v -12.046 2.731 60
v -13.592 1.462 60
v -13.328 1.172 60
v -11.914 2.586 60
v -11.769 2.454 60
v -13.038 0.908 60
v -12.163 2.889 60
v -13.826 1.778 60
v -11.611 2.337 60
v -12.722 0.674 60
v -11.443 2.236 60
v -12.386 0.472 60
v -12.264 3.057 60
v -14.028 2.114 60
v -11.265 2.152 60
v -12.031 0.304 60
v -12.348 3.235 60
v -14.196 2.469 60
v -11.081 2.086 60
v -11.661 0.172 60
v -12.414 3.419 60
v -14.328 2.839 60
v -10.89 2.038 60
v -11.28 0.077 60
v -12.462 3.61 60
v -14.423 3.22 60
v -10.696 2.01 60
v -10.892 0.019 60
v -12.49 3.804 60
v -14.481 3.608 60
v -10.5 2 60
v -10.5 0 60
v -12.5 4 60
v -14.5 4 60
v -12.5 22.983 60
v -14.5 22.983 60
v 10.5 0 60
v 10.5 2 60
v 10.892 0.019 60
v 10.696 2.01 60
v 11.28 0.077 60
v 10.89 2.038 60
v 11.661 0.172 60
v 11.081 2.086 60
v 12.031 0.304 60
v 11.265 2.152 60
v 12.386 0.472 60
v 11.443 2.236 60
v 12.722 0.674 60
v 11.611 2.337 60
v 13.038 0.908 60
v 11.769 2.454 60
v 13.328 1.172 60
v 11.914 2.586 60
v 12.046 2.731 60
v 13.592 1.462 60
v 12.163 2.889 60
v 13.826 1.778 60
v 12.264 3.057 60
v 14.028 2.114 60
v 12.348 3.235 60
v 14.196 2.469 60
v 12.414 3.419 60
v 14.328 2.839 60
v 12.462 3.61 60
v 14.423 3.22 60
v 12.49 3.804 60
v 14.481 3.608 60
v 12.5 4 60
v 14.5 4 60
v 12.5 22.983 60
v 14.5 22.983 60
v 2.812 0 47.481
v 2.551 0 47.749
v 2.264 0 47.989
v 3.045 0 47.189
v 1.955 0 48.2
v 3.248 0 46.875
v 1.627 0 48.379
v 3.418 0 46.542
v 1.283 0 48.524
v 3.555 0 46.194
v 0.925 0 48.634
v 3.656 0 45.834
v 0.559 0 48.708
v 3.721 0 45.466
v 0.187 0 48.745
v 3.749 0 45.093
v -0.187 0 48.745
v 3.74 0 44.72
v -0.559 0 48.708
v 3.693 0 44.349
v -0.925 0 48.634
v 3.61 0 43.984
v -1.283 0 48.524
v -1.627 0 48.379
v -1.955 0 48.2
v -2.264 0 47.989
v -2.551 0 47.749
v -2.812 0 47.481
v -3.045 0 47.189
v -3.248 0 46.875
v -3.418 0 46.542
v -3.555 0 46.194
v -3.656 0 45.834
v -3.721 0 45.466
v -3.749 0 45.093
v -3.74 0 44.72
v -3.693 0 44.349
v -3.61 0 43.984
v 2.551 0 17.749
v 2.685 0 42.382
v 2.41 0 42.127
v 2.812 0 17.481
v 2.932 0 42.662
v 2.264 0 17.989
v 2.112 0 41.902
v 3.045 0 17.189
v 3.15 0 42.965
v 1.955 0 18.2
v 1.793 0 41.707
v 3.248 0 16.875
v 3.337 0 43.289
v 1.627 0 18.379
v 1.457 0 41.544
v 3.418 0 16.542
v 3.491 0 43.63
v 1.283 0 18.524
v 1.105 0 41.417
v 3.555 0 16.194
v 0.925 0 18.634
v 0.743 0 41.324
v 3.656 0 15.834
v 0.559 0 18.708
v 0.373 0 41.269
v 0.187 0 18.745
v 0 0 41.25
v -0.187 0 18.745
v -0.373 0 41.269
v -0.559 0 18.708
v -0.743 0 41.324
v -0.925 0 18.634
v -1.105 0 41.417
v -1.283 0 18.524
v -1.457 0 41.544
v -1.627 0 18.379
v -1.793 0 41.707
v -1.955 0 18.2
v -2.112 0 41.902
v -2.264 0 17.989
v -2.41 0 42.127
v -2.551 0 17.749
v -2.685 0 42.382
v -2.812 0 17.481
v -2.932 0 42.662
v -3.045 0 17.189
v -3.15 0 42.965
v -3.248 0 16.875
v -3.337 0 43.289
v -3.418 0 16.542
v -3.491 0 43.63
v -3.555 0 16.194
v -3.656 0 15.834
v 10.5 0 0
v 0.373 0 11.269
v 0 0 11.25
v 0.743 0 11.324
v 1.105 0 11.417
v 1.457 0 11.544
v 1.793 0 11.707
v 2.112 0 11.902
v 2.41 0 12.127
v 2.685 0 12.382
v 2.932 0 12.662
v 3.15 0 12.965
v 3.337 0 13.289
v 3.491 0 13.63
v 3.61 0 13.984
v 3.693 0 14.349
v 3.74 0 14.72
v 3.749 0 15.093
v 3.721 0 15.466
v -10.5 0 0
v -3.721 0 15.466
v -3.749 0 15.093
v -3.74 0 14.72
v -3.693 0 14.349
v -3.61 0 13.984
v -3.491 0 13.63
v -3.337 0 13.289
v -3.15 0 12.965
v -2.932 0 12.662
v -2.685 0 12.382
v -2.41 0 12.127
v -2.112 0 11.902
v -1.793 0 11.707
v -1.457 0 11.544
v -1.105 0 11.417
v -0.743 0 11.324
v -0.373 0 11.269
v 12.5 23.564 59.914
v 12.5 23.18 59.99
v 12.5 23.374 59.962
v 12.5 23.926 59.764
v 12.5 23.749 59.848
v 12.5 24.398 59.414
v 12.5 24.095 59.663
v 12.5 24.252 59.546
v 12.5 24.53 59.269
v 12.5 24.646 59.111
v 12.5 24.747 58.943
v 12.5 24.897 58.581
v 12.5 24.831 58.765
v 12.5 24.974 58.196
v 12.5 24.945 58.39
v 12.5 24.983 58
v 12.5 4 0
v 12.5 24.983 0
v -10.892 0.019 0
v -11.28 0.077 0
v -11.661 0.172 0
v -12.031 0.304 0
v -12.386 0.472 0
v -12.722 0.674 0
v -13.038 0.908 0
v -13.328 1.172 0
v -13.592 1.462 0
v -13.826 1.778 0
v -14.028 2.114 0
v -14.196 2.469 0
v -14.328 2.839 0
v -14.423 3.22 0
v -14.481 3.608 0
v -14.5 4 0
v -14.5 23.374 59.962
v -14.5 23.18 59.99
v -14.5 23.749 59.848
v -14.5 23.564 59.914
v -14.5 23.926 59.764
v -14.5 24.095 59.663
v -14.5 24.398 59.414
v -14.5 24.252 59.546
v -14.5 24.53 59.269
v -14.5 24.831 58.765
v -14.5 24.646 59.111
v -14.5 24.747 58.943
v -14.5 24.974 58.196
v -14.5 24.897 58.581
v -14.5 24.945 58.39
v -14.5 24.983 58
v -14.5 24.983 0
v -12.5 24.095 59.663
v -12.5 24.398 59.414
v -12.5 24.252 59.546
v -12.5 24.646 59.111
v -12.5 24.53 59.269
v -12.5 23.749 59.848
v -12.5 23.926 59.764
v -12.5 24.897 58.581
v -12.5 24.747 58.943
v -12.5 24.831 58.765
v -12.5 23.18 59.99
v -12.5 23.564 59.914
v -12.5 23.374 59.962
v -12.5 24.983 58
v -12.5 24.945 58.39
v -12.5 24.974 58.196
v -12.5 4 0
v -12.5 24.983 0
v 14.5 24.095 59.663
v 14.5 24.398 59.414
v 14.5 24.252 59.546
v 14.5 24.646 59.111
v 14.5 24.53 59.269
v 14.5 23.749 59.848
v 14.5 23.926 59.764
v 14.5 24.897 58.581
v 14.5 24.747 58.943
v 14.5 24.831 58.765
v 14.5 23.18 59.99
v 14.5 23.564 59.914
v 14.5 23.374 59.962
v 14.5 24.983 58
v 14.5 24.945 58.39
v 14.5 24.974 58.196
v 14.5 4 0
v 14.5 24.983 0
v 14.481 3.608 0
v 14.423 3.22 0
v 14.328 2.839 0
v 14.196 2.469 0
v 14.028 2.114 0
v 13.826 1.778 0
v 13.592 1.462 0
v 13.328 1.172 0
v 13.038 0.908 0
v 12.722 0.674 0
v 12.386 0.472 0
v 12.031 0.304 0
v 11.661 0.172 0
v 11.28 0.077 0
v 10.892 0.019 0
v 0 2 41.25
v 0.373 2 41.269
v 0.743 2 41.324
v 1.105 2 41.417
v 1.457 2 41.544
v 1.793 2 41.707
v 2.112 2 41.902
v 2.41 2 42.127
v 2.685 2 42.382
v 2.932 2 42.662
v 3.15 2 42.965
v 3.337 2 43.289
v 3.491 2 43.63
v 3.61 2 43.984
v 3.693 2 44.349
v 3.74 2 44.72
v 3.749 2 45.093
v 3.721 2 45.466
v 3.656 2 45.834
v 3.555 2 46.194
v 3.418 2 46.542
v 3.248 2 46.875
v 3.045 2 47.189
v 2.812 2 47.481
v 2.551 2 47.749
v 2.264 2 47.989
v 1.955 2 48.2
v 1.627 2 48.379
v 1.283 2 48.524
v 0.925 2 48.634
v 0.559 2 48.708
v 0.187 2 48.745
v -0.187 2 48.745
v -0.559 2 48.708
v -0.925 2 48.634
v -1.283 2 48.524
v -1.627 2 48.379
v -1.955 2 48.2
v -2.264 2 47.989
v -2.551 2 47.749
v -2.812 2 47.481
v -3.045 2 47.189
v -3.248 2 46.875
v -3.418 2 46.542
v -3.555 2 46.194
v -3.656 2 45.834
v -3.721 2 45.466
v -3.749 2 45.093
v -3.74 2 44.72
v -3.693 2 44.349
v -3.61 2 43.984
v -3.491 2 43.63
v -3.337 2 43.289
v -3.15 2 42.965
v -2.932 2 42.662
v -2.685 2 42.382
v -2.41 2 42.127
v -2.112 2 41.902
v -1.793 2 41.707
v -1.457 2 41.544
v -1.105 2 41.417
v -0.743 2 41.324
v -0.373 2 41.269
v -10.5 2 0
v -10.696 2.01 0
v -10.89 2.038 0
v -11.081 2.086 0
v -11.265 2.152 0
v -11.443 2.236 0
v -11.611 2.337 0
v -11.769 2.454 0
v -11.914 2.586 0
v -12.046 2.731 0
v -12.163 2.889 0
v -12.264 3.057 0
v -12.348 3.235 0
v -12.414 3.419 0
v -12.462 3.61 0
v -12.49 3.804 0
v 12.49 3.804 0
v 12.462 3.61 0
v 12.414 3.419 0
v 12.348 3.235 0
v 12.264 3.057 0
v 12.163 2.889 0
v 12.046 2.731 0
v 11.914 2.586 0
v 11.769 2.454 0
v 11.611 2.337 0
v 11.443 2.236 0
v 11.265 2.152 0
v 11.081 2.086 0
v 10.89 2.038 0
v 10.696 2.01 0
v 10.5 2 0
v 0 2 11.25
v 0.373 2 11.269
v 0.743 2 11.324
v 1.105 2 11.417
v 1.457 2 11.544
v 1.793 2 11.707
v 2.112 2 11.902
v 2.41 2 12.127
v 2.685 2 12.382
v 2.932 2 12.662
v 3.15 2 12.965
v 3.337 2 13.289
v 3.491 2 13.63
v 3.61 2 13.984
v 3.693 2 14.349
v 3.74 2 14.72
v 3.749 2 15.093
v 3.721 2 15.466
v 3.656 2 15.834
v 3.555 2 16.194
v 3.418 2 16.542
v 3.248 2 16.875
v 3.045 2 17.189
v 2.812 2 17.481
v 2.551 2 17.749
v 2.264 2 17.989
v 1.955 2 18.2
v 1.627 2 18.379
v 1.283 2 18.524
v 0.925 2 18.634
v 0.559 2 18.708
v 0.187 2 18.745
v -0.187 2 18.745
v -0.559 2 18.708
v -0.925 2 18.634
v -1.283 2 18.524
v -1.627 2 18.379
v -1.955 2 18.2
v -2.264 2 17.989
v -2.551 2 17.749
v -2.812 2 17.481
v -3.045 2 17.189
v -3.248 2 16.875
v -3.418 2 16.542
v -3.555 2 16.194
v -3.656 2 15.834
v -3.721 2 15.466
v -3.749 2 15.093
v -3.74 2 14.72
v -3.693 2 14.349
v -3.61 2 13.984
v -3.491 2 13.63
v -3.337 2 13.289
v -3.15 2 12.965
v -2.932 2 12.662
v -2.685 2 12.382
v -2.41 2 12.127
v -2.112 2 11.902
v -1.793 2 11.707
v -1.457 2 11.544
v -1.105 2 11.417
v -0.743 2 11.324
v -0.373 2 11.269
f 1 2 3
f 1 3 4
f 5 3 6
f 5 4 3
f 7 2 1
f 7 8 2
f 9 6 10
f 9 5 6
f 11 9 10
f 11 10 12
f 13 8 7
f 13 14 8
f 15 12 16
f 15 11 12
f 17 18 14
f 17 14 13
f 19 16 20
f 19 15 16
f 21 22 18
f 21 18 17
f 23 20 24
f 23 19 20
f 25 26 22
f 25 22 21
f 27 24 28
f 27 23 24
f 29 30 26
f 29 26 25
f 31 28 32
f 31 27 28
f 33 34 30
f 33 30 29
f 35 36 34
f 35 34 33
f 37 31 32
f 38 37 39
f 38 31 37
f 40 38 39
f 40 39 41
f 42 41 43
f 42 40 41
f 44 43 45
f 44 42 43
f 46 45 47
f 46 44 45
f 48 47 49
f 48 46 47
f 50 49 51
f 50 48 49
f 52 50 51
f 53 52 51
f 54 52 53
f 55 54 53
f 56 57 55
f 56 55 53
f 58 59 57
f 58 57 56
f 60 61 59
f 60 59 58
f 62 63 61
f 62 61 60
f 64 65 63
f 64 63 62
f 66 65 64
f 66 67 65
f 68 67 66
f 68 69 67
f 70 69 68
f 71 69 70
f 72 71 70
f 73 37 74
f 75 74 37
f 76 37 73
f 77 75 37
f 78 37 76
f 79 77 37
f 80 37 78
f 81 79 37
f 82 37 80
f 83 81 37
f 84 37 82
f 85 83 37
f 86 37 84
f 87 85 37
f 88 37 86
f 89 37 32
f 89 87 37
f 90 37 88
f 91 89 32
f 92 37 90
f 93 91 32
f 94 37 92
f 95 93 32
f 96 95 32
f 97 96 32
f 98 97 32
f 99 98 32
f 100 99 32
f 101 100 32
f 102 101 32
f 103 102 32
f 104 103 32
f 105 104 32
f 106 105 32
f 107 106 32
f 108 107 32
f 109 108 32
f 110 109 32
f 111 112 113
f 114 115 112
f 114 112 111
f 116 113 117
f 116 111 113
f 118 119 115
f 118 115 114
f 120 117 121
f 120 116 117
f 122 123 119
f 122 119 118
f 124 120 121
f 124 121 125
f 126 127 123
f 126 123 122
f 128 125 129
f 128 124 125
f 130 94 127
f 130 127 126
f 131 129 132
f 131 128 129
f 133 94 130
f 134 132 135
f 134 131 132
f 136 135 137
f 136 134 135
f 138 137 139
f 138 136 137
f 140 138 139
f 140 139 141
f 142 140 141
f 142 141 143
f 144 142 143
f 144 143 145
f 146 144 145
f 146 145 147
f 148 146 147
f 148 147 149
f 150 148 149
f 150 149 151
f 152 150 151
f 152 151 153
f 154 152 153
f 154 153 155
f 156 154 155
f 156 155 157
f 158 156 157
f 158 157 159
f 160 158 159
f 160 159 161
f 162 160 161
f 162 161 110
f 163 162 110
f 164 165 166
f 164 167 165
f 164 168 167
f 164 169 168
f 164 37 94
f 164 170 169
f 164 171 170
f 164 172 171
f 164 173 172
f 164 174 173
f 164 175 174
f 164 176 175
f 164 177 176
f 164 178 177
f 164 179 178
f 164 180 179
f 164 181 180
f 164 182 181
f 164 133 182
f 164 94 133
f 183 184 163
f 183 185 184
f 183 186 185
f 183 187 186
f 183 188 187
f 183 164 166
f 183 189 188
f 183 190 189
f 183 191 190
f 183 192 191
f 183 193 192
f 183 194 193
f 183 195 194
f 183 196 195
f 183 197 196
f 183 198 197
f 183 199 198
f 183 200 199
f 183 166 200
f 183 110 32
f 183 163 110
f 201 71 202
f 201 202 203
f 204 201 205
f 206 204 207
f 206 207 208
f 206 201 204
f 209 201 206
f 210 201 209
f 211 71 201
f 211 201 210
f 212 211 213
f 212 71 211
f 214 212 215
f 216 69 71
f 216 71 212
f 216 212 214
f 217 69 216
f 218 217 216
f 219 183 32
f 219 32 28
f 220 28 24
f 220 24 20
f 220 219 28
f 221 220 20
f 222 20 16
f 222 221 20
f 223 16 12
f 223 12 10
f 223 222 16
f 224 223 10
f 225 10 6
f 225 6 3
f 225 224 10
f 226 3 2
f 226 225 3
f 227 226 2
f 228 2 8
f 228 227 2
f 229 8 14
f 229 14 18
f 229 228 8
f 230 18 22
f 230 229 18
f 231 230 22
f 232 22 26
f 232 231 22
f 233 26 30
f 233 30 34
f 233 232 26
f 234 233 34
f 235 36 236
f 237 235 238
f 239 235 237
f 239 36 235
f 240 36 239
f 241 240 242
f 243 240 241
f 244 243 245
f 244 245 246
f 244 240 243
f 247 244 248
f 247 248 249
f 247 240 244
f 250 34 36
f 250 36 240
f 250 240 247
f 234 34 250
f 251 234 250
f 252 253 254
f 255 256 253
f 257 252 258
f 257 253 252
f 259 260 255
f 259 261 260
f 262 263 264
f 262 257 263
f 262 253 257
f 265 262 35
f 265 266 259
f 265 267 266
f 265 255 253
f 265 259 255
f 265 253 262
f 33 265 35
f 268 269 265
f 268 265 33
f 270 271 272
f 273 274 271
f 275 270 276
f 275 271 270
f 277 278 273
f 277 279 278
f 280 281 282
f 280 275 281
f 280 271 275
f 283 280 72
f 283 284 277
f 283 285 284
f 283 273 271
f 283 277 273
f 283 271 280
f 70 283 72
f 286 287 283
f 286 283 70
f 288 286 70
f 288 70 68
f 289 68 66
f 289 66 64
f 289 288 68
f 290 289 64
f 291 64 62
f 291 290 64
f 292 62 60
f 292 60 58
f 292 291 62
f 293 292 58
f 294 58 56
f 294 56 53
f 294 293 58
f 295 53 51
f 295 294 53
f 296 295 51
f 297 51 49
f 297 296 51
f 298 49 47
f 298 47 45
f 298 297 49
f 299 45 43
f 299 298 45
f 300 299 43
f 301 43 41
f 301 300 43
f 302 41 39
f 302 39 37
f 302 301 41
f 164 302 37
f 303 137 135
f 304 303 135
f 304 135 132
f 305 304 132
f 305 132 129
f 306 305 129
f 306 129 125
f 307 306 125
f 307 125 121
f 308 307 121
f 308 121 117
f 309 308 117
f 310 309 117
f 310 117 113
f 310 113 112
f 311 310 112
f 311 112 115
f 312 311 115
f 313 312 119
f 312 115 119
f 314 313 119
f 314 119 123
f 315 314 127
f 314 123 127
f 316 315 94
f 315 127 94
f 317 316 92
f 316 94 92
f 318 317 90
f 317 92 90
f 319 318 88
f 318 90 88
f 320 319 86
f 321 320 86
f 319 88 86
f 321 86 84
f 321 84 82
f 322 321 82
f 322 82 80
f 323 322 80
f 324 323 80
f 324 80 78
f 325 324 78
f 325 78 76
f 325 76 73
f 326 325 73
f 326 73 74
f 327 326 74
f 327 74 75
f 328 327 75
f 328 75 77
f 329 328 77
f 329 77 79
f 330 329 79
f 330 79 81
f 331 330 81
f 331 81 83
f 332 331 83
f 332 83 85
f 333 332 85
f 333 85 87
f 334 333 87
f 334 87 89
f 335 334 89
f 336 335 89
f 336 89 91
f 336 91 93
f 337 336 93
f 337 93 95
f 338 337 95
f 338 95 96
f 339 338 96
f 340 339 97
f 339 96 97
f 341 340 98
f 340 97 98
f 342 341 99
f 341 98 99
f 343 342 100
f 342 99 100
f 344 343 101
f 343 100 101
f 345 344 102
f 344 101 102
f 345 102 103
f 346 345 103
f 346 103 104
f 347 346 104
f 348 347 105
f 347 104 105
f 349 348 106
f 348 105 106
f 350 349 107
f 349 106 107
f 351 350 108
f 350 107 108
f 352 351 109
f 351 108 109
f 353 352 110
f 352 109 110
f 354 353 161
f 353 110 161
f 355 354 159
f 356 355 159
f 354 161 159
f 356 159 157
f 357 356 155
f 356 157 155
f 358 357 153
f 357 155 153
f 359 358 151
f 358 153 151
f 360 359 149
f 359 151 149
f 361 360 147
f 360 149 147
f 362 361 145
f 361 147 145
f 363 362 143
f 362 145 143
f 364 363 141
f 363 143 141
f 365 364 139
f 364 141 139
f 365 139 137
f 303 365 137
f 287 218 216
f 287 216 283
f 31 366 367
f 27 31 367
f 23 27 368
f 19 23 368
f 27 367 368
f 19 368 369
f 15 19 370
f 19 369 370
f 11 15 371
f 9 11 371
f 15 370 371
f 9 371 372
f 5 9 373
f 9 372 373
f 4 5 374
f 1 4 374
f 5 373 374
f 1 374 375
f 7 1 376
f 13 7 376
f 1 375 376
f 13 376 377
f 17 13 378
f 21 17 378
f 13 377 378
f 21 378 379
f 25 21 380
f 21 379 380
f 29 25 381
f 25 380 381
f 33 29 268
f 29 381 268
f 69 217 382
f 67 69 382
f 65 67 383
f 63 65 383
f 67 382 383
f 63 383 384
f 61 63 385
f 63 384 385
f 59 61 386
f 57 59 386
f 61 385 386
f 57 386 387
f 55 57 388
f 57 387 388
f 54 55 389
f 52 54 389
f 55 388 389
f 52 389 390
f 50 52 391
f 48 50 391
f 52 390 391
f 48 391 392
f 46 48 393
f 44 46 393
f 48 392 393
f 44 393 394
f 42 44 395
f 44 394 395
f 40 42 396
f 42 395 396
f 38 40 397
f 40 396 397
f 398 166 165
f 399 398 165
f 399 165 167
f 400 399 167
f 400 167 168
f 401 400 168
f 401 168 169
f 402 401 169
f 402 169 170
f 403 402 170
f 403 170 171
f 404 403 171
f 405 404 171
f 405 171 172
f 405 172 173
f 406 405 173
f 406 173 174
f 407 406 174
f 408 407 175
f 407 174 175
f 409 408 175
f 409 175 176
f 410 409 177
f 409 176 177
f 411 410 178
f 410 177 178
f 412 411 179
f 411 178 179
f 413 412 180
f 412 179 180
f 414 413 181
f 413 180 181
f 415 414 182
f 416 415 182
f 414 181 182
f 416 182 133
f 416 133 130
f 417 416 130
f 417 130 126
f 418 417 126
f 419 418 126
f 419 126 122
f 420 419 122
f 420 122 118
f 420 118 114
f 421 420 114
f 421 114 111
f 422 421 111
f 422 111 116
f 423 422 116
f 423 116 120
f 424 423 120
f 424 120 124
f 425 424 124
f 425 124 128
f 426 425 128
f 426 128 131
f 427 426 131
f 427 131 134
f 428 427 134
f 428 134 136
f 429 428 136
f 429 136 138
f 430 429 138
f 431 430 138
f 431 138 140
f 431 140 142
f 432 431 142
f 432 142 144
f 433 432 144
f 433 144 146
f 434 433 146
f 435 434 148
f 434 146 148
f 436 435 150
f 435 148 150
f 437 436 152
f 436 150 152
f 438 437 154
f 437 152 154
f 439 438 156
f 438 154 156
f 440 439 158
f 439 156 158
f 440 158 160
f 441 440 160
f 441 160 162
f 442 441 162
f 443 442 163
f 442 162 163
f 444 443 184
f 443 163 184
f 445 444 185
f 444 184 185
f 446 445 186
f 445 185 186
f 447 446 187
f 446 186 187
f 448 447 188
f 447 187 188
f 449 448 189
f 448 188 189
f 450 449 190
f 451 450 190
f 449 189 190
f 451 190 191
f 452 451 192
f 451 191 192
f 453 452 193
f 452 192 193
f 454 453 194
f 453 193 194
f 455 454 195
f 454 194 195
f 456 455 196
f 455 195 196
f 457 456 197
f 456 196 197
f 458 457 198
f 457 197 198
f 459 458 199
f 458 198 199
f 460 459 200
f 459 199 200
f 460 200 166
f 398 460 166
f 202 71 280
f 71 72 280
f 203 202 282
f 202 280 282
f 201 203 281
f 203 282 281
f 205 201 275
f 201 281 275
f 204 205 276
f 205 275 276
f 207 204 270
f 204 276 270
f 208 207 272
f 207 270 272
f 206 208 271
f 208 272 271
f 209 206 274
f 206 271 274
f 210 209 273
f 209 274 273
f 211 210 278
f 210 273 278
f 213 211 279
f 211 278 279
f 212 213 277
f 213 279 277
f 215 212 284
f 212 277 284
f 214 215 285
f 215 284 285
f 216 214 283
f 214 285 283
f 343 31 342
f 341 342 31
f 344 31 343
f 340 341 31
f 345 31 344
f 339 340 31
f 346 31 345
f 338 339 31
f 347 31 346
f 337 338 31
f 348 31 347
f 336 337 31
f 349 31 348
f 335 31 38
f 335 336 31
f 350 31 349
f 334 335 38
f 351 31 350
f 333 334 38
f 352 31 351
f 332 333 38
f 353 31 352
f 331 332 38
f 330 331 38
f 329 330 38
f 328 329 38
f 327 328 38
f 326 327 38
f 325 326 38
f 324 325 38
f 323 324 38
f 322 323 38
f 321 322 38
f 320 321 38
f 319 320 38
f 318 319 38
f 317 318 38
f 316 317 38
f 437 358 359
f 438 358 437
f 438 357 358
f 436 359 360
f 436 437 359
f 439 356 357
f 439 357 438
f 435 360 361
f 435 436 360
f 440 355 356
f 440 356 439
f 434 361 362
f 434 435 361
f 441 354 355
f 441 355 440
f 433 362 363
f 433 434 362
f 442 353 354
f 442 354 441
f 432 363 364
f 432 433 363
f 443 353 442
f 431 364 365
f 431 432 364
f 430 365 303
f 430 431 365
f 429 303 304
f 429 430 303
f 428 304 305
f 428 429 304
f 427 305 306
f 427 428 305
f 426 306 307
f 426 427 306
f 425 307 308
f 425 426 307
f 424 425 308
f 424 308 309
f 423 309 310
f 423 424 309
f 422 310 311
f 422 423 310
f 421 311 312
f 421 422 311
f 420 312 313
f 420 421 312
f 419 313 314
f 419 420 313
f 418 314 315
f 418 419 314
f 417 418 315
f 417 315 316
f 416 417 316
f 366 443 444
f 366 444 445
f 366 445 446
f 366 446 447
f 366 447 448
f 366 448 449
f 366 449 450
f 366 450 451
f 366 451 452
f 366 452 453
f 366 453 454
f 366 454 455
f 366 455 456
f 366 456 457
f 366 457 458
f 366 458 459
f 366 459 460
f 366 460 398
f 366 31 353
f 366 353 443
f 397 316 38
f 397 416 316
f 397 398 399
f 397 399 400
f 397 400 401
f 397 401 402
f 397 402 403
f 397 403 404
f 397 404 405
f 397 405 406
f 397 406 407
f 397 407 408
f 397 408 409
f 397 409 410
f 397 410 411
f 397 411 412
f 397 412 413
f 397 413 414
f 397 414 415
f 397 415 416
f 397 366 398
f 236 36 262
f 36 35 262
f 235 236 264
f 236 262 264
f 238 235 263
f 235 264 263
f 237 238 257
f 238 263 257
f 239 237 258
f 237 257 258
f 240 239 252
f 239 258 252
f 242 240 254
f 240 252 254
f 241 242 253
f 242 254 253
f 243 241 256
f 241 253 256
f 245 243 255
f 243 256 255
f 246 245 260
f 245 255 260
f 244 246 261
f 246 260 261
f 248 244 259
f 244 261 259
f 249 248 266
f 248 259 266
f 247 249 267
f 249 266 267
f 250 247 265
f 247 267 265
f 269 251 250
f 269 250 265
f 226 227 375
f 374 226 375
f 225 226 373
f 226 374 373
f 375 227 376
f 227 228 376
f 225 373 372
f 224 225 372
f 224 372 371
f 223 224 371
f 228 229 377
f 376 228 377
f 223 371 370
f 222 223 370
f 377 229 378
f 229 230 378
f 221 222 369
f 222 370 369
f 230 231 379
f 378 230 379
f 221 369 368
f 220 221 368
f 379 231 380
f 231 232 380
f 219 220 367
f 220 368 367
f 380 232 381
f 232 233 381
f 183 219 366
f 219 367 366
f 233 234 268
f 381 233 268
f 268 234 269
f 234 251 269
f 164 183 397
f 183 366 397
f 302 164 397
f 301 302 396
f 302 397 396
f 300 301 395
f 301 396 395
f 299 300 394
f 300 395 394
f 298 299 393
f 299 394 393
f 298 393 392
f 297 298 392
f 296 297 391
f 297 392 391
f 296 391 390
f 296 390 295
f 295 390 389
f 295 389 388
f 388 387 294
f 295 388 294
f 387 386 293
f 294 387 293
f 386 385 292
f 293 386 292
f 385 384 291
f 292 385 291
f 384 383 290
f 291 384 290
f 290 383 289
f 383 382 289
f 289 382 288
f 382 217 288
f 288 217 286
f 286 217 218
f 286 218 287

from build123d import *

# Parameters (mm, degrees)
EXTRUDE_1_DEPTH       = 60
SHEET_METAL_1_DEPTH   = 60
SHEET_METAL_1_2_DEPTH = 60
CUT_EXTRUDE_1_REACH   = 68.591
SKETCH_2_R            = 3.75
FILLET_1_R            = 2


# Read off the part's stored shape, not the designer's step: Преобразовать-Твердое тело1
with BuildPart() as part:
    # Sketch 1 → Бобышка-Вытянуть1 (new body)
    with BuildSketch(Plane.XY):
        Polygon((-12.5, 2), (12.5, 2), (12.5, 24.983479724), (14.5, 24.983479724), (14.5, 0), (-14.5, 0), (-14.5, 24.983479724), (-12.5, 24.983479724), align=None)
    extrude(amount=EXTRUDE_1_DEPTH)

    # Sheet Metal 1 outline → Sheet Metal 1 (cut)
    with BuildSketch(Plane.XY):
        with BuildLine():
            Line((-14.5, 0), (-10.5, 0))
            ThreePointArc((-10.5, 0), (-13.328427125, 1.171572875), (-14.5, 4))
            Line((-14.5, 4), (-14.5, 0))
        make_face()
        with BuildLine():
            ThreePointArc((14.5, 4), (13.328427125, 1.171572875), (10.5, 0))
            Line((10.5, 0), (14.5, 0))
            Line((14.5, 0), (14.5, 4))
        make_face()
    extrude(amount=SHEET_METAL_1_DEPTH, mode=Mode.SUBTRACT)

    # Sheet Metal 1 2 outline → Sheet Metal 1 2 (add)
    with BuildSketch(Plane.XY):
        with BuildLine():
            Line((-12.5, 2), (-10.5, 2))
            ThreePointArc((-10.5, 2), (-11.914213562, 2.585786438), (-12.5, 4))
            Line((-12.5, 4), (-12.5, 2))
        make_face()
        with BuildLine():
            ThreePointArc((12.5, 4), (11.914213562, 2.585786438), (10.5, 2))
            Line((10.5, 2), (12.5, 2))
            Line((12.5, 2), (12.5, 4))
        make_face()
    extrude(amount=SHEET_METAL_1_2_DEPTH)

    # Sketch 2 → Вырез-Вытянуть1 (cut, up to next)
    with BuildSketch(Plane.XZ, mode=Mode.PRIVATE) as cut_extrude_1_sk1:
        with Locations(Location((0, 45, 0), (0, 0, 270))):
            Circle(SKETCH_2_R)
    cut_extrude_1_tool1 = extrude(cut_extrude_1_sk1.sketch, amount=-CUT_EXTRUDE_1_REACH, mode=Mode.PRIVATE) & part.part
    # Sketch 2 → Вырез-Вытянуть1 (cut, up to next)
    with BuildSketch(Plane.XZ, mode=Mode.PRIVATE) as cut_extrude_1_sk2:
        with Locations(Location((0, 15, 0), (0, 0, 270))):
            Circle(SKETCH_2_R)
    cut_extrude_1_tool2 = extrude(cut_extrude_1_sk2.sketch, amount=-CUT_EXTRUDE_1_REACH, mode=Mode.PRIVATE) & part.part
    add(cut_extrude_1_tool1.solids().sort_by_distance((0, 0, 45))[0], mode=Mode.SUBTRACT)
    add(cut_extrude_1_tool2.solids().sort_by_distance((0, 0, 15))[0], mode=Mode.SUBTRACT)

    # Скругление1
    fillet_1_edges = [part.edges().sort_by_distance(p)[0] for p in [
        (13.5, 24.983479724, 60),
        (-13.5, 24.983479724, 60),
    ]]
    fillet(fillet_1_edges, radius=FILLET_1_R)


solid = part.part
